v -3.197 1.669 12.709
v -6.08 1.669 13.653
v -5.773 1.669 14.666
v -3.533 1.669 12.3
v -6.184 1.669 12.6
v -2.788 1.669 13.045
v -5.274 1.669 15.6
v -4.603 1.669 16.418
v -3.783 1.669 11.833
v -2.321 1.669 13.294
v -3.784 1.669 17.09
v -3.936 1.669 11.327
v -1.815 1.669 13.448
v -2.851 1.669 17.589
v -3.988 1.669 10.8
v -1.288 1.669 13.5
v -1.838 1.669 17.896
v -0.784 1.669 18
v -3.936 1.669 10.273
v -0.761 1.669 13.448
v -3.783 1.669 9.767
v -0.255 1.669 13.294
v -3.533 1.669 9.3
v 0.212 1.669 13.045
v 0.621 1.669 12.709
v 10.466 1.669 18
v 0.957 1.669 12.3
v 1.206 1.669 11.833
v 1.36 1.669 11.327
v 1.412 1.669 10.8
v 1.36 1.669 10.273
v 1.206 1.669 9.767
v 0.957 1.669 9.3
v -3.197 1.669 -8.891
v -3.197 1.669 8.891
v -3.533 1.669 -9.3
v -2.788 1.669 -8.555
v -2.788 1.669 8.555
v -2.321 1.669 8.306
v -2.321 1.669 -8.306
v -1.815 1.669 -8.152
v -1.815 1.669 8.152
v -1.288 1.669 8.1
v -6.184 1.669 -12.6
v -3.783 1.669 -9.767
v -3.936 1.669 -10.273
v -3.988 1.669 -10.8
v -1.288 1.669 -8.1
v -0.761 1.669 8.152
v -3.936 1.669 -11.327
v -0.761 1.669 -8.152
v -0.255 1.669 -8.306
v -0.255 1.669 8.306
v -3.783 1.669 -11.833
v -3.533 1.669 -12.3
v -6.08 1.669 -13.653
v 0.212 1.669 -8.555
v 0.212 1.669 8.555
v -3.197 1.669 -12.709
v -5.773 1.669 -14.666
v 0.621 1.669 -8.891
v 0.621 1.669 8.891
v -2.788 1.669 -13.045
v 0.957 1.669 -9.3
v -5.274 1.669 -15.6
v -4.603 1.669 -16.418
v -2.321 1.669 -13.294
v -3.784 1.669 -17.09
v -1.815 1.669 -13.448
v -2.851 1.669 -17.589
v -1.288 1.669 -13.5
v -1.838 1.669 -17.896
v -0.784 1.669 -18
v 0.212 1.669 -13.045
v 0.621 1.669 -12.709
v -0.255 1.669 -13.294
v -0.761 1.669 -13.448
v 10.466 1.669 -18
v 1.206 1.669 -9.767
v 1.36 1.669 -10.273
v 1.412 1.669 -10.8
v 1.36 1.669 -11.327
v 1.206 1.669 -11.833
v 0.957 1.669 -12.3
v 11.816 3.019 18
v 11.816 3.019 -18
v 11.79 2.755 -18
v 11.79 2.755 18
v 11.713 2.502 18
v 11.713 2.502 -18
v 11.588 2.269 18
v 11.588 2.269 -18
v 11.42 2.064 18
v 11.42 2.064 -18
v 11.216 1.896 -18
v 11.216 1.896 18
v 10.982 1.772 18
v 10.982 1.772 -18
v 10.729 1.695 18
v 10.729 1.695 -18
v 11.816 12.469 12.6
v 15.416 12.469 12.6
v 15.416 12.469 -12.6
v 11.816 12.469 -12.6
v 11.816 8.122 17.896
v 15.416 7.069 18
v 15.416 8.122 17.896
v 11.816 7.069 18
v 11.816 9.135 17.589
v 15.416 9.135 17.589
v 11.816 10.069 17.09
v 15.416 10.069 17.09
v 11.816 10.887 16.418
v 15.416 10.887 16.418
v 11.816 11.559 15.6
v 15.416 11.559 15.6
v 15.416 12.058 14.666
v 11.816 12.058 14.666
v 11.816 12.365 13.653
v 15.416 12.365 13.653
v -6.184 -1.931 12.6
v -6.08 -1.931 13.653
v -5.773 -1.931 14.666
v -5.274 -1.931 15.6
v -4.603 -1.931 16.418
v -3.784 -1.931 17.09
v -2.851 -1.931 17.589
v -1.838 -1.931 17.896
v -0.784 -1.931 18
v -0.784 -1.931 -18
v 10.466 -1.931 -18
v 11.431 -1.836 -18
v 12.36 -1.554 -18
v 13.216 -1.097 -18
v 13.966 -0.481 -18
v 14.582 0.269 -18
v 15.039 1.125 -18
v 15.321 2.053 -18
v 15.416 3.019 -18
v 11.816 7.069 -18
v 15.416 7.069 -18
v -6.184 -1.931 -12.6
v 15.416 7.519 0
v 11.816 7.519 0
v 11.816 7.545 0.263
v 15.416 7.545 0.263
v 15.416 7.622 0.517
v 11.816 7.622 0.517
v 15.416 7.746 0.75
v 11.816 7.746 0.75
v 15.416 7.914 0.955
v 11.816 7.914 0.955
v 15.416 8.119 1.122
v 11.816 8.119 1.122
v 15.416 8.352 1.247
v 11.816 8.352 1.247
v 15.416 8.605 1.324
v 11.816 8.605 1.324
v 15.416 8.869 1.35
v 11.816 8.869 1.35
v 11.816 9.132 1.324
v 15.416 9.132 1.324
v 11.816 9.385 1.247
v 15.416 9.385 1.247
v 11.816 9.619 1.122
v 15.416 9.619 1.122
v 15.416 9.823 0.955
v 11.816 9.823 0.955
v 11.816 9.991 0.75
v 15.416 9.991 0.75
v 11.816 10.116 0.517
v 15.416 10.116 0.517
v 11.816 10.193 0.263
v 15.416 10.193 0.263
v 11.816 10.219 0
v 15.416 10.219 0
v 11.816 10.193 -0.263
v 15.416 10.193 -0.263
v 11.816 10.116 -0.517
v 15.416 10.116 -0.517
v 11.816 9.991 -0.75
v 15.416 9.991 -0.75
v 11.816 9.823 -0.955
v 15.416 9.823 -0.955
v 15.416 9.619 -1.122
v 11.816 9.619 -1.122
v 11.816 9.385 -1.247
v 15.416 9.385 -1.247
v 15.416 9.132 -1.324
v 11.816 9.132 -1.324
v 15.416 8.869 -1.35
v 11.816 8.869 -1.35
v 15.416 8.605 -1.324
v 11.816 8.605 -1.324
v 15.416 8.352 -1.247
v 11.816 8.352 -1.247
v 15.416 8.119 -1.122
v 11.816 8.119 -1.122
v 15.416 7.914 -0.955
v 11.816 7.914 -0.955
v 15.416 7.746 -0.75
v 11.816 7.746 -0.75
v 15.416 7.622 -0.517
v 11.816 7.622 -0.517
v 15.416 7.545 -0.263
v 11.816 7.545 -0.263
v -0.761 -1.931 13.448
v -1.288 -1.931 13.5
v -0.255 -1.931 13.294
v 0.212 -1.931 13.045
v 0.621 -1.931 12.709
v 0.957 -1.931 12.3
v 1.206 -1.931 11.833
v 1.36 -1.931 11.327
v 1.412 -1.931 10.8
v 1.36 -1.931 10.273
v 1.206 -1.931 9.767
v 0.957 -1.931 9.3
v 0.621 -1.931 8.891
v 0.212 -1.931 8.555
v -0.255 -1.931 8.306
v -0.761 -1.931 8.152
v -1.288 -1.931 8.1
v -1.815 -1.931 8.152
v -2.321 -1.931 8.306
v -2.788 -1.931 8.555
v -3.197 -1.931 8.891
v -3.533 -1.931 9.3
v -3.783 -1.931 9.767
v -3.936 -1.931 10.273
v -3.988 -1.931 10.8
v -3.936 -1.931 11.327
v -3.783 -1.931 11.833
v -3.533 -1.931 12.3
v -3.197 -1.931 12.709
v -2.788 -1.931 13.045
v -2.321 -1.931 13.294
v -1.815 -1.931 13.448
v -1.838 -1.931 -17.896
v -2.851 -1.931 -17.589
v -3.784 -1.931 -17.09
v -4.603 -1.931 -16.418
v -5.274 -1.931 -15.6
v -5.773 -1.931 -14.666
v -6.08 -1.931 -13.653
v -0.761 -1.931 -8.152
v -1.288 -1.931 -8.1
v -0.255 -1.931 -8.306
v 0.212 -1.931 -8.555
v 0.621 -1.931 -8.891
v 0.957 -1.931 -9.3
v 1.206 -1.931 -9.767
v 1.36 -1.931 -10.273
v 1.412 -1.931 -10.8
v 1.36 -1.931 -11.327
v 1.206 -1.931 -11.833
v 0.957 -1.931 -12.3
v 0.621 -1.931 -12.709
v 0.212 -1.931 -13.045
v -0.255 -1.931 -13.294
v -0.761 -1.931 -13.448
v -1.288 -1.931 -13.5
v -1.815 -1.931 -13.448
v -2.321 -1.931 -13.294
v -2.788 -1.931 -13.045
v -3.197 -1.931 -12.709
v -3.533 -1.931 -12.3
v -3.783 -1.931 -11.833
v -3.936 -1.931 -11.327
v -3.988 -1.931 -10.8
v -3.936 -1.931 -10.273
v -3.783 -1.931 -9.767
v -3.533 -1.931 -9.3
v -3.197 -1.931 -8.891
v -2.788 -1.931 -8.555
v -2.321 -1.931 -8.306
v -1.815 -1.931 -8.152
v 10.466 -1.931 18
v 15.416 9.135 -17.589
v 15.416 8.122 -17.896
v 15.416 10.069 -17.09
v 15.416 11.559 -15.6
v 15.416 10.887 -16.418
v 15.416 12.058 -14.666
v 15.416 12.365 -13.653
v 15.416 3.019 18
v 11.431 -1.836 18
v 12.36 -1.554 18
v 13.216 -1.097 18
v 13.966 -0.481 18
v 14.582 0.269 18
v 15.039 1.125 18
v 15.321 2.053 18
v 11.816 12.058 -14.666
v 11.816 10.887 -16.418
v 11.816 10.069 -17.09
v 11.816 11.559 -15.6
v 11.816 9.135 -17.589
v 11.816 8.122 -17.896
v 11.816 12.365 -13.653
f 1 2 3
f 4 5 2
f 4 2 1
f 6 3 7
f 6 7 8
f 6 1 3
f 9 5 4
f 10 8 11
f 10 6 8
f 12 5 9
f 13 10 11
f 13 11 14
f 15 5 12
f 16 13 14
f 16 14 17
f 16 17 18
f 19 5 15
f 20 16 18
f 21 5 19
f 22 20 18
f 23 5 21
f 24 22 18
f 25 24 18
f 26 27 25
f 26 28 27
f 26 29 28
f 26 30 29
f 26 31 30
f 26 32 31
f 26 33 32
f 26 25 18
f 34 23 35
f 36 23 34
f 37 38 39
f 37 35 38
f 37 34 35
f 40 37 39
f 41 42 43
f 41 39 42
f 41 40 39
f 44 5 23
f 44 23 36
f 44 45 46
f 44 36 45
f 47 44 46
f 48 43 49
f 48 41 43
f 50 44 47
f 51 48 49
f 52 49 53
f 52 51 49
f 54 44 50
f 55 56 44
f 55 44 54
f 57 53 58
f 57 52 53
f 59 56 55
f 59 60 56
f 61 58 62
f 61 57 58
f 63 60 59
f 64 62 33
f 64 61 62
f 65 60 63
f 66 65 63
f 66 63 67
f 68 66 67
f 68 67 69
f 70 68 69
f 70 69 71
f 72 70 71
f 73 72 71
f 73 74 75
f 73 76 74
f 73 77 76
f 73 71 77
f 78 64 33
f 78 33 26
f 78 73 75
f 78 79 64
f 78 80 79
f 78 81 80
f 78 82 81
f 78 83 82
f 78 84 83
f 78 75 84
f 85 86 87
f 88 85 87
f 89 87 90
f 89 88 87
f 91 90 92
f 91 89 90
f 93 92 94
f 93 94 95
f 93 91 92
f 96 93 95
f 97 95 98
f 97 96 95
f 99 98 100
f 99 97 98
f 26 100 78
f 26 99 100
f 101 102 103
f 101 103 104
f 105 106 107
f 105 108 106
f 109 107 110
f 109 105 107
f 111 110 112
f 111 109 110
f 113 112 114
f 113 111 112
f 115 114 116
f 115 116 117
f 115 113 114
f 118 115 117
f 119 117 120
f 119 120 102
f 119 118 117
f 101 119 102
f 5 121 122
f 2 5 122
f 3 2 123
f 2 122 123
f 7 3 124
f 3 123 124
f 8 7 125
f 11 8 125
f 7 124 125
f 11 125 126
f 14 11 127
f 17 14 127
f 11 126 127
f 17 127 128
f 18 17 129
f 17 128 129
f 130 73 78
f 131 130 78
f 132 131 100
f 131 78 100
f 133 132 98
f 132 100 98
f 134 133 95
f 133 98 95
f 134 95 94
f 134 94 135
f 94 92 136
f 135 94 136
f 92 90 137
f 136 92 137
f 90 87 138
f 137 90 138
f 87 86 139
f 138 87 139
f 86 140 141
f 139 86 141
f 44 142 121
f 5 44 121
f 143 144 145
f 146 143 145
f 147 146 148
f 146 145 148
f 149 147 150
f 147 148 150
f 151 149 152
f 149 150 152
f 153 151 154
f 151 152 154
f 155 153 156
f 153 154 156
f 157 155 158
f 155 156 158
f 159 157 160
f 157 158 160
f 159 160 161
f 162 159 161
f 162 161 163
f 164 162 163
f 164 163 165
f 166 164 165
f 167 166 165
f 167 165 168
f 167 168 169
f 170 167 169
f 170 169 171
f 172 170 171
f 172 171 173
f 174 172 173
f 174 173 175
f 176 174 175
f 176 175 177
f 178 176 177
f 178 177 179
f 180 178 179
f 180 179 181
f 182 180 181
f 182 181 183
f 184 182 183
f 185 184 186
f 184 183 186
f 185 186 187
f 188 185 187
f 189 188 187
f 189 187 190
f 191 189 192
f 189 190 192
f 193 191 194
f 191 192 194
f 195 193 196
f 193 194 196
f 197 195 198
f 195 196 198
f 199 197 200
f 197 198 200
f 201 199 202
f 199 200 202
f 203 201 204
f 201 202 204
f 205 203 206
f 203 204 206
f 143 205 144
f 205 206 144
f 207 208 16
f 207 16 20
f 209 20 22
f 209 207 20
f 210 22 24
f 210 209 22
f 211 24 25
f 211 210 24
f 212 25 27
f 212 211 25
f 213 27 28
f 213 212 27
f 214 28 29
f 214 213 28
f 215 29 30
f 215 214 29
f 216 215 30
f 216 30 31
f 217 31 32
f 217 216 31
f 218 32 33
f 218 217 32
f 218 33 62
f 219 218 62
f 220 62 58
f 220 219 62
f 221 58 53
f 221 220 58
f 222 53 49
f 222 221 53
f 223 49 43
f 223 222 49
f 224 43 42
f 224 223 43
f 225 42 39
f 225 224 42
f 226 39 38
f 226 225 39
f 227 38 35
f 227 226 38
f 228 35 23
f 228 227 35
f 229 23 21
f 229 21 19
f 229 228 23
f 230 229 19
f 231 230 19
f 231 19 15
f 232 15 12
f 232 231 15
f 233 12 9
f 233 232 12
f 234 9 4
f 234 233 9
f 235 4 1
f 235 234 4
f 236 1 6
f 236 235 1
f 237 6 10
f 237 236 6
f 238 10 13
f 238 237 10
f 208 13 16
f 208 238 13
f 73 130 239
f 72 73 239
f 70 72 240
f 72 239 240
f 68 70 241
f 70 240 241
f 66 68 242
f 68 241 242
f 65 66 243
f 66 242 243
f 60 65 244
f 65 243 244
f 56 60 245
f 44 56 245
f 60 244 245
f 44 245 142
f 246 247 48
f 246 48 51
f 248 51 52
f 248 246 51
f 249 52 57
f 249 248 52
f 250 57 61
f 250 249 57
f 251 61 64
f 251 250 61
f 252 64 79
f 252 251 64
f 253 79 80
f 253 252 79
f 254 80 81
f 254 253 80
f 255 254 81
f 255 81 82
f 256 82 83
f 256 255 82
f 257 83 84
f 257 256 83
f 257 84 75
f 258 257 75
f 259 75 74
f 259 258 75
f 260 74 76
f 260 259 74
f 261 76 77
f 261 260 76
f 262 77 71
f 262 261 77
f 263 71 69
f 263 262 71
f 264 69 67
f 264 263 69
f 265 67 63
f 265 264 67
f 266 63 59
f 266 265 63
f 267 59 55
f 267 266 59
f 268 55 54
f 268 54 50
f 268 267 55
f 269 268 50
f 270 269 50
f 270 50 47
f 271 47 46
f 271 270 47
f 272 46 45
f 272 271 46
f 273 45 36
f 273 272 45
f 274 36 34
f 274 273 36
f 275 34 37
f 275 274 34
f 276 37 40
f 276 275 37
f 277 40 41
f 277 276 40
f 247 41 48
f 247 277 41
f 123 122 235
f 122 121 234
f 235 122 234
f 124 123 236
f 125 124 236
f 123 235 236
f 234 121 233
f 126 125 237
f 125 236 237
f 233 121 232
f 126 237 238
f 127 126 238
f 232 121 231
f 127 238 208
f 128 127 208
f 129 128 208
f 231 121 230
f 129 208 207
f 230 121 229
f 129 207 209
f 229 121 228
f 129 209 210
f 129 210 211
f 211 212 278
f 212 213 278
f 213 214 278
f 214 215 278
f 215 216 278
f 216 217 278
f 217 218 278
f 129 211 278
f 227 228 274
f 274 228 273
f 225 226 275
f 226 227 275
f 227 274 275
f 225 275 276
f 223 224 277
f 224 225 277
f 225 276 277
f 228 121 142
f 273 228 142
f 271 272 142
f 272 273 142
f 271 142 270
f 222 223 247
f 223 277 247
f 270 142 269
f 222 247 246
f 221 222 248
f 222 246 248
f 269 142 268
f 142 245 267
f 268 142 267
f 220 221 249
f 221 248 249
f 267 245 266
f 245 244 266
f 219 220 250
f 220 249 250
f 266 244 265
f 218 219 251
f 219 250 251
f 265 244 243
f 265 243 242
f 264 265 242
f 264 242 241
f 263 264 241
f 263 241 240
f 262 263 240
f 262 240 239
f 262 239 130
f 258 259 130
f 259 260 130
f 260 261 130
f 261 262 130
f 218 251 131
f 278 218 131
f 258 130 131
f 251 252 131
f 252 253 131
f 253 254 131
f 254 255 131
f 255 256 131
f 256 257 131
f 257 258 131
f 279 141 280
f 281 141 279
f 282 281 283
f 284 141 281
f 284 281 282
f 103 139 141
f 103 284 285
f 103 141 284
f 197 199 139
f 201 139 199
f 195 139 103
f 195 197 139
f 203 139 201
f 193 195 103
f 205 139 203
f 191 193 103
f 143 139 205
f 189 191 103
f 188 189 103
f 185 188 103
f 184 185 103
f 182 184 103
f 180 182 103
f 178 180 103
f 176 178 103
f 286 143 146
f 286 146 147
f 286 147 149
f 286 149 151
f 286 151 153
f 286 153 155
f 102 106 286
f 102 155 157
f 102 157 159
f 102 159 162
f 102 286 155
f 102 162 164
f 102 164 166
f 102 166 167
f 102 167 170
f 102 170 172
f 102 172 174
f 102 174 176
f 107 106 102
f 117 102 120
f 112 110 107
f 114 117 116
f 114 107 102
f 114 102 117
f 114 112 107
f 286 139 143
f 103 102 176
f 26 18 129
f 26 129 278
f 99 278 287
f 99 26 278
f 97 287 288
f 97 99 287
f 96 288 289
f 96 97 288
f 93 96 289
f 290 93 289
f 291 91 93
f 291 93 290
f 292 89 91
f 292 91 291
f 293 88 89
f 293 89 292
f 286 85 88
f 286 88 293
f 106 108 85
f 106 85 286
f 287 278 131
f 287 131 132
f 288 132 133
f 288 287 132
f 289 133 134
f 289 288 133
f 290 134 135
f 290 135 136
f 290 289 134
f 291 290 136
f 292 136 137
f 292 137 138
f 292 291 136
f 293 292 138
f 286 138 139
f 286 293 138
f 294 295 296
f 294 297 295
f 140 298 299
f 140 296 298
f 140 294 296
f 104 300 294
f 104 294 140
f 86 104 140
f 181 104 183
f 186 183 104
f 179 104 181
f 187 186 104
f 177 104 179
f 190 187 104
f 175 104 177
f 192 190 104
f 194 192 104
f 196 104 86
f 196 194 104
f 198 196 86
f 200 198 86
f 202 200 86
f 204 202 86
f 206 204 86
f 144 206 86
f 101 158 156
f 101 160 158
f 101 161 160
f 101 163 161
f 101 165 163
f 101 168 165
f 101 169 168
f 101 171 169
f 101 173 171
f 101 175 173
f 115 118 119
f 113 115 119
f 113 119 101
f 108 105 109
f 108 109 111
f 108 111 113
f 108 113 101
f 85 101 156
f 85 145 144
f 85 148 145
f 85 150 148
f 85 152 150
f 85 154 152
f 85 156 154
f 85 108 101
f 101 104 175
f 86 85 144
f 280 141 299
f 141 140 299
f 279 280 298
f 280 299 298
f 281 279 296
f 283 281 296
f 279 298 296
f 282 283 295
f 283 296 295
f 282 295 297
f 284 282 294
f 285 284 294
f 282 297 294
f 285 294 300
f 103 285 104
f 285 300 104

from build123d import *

# Parameters (mm, degrees)
SKETCH1_R                    = 1.5
BASE_FLANGE1_DEPTH           = 2
EDGE_FLANGE1_STRIP_W         = 9.5
EDGE_FLANGE1_STRIP_H         = 2
EDGE_FLANGE1_STRIP_CUT_DEPTH = 20
EDGE_FLANGE1_DEPTH           = 20
SKETCH9_R                    = 0.75
CUT_EXTRUDE1_DEPTH           = 10
FILLET1_R                    = 3
SCALE1_SCALE                 = 1.8


# Sheet-metal steps are written as plain solids
with BuildPart() as part:
    # Sketch1 → Base-Flange1 (new body)
    with BuildSketch(Plane(origin=(0, 0, 0), x_dir=(1, 0, 0), z_dir=(0, 1, 0))):
        with BuildLine():
            Line((0, 7), (0, -7))
            ThreePointArc((0, -7), (0.878679656, -9.121320344), (3, -10))
            Line((3, -10), (12, -10))
            Line((12, -10), (12, 10))
            Line((12, 10), (3, 10))
            ThreePointArc((3, 10), (0.878679656, 9.121320344), (0, 7))
        make_face()
        with Locations(Location((2.72, 6, 0), (0, 0, 270))):
            Circle(SKETCH1_R, mode=Mode.SUBTRACT)
        with Locations(Location((2.72, -6, 0), (0, 0, 270))):
            Circle(SKETCH1_R, mode=Mode.SUBTRACT)
    extrude(amount=BASE_FLANGE1_DEPTH)

    # Edge-Flange1 strip (across the edge) → Edge-Flange1 strip cut (cut)
    with BuildSketch(Plane(origin=(12, 2, 10), x_dir=(-1, 0, 0), z_dir=(0, 0, -1))):
        with Locations((-2, -1)):
            Rectangle(EDGE_FLANGE1_STRIP_W, EDGE_FLANGE1_STRIP_H)
    extrude(amount=EDGE_FLANGE1_STRIP_CUT_DEPTH, mode=Mode.SUBTRACT)

    # Edge-Flange1 section (across the edge) → Edge-Flange1 (add)
    with BuildSketch(Plane(origin=(12, 2, 10), x_dir=(-1, 0, 0), z_dir=(0, 0, -1))):
        with BuildLine():
            Line((0, 0.75), (0, 6))
            Line((0, 6), (2, 6))
            Line((2, 6), (2, 0.75))
            ThreePointArc((2, 0.75), (2.219669914, 0.219669914), (2.75, 0))
            Line((2.75, 0), (2.75, -2))
            ThreePointArc((2.75, -2), (0.805456352, -1.194543648), (0, 0.75))
        make_face()
    extrude(amount=EDGE_FLANGE1_DEPTH)

    # Sketch9 → Cut-Extrude1 (cut)
    with BuildSketch(Plane.ZY.offset(-10)):
        with Locations(Location((0, 6, 0), (0, 0, 270))):
            Circle(SKETCH9_R)
    extrude(amount=-CUT_EXTRUDE1_DEPTH, mode=Mode.SUBTRACT)

    # Fillet1
    fillet1_edges = [part.edges().sort_by_distance(p)[0] for p in [
        (11, 8, 10),
        (11, 8, -10),
    ]]
    fillet(fillet1_edges, radius=FILLET1_R)


with BuildPart() as part_1:
    # Scale1: scaled about (7.730300008, 2.413989503, 0)
    add(part.part.scale(SCALE1_SCALE).moved(Location((-6.184240006, -1.931191602, 0))))


solid = part_1.part
